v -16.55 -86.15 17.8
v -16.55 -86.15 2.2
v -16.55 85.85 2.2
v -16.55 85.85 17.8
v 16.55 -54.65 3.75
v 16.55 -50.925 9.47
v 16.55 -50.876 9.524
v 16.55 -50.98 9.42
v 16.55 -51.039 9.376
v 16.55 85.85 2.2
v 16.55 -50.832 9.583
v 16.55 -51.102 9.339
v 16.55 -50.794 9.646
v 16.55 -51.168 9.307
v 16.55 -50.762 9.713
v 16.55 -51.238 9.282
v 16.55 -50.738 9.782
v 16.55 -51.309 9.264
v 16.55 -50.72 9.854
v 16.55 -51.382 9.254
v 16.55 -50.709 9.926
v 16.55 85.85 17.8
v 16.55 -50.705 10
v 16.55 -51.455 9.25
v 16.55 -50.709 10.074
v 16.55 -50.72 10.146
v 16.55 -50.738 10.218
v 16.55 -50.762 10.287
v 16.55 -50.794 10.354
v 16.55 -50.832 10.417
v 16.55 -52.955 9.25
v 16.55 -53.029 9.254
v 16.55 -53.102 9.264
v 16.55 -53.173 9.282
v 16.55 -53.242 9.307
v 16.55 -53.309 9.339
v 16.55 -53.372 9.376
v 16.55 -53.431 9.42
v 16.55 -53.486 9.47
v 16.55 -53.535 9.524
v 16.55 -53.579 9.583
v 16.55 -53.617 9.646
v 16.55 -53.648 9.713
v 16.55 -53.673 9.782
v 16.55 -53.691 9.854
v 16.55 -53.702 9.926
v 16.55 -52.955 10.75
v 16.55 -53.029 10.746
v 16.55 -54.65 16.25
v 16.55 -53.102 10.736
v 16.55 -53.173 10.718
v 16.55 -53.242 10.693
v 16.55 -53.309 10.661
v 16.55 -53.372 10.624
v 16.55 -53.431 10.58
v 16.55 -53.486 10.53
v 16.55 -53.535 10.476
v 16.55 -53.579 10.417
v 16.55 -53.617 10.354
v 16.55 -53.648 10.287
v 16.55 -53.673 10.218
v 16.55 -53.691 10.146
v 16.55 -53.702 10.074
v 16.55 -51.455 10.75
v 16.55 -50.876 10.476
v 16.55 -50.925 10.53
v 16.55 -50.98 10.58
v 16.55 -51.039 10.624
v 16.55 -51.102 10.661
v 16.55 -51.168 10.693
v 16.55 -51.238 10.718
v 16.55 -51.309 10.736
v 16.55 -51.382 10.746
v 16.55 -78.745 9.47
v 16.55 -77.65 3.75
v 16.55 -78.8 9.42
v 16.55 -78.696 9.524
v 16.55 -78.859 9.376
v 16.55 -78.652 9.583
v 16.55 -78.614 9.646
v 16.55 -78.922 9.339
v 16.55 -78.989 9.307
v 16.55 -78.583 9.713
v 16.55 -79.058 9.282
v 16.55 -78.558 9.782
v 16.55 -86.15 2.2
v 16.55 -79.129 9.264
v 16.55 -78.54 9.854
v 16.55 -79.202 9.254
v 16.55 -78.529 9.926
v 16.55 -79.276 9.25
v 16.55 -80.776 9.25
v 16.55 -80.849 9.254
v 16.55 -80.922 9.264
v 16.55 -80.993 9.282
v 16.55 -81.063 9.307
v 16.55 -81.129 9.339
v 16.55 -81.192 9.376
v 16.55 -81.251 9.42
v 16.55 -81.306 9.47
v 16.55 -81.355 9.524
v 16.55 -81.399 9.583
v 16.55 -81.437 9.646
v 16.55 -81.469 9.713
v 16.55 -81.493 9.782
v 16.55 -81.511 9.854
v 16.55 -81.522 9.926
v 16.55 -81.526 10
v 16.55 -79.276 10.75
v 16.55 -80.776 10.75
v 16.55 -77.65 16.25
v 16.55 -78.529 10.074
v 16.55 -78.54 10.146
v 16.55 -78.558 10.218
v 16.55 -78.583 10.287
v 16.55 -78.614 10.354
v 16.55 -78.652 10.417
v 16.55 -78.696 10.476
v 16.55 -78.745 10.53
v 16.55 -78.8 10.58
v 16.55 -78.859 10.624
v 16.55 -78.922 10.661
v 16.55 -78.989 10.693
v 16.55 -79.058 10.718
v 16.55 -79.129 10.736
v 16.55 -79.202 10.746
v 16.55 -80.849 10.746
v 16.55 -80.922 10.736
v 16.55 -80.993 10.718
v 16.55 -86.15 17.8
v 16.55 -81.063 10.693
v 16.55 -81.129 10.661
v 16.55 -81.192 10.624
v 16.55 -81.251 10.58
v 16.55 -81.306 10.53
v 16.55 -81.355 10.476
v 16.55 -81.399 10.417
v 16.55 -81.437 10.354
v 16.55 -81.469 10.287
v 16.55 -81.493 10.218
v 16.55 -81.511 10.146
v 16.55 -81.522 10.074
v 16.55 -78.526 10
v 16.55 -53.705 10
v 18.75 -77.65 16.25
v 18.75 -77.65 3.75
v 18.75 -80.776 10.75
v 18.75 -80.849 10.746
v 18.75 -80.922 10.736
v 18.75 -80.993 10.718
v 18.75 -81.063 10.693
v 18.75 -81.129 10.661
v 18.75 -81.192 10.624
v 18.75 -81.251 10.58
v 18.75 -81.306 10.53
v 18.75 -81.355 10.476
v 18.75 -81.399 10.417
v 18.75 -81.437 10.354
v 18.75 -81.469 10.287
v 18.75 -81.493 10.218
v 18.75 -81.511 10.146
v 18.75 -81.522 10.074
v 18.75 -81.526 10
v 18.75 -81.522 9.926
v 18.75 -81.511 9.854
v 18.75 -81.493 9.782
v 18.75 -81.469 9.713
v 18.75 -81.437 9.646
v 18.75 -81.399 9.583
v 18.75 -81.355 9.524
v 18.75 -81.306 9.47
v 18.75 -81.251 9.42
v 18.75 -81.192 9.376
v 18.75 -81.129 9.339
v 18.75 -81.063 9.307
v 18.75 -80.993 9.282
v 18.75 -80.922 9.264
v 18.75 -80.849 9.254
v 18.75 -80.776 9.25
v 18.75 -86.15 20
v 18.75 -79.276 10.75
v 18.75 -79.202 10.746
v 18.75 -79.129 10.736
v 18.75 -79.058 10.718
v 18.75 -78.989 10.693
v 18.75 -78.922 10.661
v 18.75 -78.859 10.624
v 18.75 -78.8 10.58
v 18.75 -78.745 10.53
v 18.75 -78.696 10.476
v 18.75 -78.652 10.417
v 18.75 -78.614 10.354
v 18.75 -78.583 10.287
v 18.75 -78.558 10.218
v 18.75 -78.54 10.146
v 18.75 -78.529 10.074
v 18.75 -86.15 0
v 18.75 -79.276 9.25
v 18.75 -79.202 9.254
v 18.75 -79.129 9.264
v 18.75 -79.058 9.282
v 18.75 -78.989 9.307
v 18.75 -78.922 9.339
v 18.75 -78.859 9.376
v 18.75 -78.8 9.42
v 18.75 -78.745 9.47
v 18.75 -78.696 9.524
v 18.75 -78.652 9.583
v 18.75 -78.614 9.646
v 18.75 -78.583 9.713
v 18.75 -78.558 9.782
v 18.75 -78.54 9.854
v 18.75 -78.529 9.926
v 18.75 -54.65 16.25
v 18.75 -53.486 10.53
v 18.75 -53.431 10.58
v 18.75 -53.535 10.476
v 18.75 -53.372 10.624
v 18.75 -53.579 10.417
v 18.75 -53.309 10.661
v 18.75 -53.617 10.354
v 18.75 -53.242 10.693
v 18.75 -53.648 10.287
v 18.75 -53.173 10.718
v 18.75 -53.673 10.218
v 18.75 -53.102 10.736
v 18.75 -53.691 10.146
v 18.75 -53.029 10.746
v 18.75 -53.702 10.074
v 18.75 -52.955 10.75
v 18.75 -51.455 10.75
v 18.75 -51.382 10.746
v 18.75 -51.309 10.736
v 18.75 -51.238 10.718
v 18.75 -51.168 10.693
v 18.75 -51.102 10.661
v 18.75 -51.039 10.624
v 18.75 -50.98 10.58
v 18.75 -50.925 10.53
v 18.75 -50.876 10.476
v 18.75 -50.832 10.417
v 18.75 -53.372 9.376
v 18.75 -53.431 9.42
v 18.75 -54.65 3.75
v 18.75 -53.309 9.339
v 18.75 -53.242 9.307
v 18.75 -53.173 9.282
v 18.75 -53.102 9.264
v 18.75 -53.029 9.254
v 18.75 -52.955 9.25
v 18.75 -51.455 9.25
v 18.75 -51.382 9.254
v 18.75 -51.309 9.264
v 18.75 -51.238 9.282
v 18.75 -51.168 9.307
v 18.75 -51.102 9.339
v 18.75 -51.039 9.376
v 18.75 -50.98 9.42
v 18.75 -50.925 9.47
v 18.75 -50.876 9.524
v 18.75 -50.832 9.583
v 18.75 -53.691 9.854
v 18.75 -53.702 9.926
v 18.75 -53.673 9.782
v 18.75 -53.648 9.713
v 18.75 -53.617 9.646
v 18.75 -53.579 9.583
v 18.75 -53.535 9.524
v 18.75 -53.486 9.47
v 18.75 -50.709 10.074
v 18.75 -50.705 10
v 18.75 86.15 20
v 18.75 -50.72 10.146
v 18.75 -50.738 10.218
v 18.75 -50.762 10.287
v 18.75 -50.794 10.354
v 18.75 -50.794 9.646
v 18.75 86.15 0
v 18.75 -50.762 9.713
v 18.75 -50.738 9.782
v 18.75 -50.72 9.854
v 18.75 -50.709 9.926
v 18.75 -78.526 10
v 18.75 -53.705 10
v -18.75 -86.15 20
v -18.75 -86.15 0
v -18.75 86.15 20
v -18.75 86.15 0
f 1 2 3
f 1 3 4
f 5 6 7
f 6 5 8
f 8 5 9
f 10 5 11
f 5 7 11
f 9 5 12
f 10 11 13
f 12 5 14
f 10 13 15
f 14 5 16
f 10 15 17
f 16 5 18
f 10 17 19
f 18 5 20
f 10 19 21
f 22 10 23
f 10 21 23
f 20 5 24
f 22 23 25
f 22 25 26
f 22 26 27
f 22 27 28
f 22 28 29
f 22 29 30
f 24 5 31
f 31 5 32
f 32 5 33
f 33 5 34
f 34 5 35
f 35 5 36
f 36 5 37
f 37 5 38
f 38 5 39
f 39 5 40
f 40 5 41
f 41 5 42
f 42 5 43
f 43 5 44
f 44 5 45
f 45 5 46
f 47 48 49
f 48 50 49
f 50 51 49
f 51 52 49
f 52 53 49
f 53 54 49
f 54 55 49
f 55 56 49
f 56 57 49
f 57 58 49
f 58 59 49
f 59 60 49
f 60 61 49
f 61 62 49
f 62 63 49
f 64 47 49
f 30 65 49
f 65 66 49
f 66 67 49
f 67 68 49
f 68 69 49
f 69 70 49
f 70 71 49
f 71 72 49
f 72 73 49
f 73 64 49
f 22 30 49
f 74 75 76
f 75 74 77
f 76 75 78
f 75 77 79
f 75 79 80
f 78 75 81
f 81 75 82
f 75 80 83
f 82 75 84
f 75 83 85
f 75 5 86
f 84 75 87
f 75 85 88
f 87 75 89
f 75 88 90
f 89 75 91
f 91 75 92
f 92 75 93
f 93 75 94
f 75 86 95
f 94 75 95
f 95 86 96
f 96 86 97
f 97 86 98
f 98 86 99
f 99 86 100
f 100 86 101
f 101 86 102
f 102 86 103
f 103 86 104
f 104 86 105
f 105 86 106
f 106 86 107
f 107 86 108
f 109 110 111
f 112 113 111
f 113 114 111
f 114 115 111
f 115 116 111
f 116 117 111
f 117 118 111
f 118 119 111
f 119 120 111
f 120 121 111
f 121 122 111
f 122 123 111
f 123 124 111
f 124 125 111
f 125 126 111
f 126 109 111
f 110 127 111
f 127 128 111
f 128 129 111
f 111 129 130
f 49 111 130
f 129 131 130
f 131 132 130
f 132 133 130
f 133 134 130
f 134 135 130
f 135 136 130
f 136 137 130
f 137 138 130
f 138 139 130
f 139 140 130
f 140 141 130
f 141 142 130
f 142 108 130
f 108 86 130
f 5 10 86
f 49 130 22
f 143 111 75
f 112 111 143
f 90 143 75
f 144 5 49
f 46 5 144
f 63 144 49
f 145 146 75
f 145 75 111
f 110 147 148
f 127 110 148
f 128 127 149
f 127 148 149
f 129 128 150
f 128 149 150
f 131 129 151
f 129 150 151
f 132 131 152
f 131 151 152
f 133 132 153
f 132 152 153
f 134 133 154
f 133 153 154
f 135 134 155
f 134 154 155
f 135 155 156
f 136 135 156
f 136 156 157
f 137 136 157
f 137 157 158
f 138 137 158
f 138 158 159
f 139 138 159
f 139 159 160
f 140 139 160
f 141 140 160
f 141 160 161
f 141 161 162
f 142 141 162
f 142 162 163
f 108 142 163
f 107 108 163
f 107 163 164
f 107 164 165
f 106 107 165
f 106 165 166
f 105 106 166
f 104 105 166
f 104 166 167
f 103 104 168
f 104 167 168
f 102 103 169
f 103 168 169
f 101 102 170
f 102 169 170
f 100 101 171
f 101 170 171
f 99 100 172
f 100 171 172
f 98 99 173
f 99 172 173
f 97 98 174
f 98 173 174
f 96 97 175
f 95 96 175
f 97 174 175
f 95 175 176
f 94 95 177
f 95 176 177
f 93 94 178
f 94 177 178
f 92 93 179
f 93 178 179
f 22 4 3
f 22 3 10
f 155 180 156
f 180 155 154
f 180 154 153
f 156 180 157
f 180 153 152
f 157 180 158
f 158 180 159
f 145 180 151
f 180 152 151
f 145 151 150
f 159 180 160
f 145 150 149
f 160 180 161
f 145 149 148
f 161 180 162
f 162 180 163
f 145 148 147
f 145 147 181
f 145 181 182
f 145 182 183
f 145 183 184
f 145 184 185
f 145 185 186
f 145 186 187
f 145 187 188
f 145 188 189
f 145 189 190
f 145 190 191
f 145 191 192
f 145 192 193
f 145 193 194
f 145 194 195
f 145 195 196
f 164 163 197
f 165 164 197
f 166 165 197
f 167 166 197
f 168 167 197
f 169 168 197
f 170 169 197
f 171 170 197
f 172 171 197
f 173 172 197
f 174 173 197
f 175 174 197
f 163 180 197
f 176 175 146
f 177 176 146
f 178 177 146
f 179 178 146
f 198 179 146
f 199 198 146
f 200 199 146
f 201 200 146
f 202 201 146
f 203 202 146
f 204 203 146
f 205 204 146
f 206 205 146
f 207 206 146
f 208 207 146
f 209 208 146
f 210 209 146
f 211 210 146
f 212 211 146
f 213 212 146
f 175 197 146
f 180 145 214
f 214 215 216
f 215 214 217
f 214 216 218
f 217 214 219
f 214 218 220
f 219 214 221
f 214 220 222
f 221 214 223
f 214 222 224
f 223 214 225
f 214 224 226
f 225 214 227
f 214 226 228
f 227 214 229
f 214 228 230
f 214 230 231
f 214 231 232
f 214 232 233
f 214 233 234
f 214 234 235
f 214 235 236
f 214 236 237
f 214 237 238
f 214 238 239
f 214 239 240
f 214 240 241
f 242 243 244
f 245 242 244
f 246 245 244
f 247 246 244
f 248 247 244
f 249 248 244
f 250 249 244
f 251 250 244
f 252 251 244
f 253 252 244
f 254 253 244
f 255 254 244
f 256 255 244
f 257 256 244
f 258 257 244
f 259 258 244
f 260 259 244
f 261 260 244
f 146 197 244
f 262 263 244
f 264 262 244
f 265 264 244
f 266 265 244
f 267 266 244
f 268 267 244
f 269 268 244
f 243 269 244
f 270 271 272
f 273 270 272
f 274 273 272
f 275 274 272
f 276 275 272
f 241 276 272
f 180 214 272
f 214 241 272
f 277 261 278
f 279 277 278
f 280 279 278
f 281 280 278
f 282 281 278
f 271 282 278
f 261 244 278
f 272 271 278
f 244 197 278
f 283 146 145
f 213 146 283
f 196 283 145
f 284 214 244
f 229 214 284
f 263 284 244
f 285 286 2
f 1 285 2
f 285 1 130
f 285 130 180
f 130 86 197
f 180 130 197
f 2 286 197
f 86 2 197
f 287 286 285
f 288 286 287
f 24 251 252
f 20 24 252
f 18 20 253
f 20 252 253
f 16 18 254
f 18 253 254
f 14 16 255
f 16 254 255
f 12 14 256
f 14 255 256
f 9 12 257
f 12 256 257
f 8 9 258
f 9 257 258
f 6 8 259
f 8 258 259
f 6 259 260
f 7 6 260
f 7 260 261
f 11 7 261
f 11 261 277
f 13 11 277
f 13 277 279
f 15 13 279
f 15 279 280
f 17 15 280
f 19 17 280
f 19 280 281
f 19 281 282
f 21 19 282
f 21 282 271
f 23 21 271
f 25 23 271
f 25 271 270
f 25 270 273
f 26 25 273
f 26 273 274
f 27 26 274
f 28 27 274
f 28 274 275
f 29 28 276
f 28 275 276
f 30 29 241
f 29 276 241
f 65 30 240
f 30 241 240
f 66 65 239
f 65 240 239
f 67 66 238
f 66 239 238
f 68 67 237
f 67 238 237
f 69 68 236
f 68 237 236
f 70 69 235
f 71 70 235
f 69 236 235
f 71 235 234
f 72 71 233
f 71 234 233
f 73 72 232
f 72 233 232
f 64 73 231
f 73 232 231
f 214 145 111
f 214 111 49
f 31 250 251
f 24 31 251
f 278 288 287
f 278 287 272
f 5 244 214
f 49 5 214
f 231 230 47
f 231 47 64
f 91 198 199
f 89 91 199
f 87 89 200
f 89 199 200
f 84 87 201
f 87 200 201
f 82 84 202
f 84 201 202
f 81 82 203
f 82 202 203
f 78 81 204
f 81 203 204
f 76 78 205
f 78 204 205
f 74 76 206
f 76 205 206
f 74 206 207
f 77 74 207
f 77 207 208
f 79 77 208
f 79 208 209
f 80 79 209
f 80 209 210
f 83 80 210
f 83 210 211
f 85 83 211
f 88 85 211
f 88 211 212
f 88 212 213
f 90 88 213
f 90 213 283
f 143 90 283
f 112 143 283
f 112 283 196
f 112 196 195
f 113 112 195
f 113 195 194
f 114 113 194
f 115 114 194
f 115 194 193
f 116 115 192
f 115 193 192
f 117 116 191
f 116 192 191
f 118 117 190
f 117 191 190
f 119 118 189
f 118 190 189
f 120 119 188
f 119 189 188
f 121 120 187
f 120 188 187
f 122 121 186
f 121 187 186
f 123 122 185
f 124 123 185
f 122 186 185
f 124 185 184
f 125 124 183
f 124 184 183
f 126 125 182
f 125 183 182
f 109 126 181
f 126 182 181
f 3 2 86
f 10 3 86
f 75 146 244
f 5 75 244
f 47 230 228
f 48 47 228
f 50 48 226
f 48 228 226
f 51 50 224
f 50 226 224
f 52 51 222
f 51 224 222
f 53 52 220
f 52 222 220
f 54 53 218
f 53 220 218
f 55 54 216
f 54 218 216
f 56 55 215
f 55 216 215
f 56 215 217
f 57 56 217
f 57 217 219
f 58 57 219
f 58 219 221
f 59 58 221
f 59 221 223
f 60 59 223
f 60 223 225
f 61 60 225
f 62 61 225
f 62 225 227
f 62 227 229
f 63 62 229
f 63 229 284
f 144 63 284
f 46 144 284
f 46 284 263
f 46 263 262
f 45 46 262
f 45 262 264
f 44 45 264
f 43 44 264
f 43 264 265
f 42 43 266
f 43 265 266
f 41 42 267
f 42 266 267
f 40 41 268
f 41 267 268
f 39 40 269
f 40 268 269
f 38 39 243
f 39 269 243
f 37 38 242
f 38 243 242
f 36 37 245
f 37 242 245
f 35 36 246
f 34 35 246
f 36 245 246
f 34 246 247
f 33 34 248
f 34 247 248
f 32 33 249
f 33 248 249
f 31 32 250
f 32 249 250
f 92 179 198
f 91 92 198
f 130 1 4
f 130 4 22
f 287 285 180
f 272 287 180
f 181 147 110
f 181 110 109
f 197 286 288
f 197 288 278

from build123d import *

# Parameters (mm, degrees)
SKETCH007_W     = 37.5
SKETCH007_H     = 172.3
PAD002_DEPTH    = 20
SKETCH006_W     = 33.1
SKETCH006_H     = 15.6
POCKET004_DEPTH = 172
SKETCH009_W     = 23
SKETCH009_H     = 12.5
POCKET003_DEPTH = 10
POCKET005_DEPTH = 5


with BuildPart() as part:
    # Sketch007 → Pad002 (new body)
    with BuildSketch(Plane.XY):
        Rectangle(SKETCH007_W, SKETCH007_H)
    extrude(amount=PAD002_DEPTH)

    # Sketch006 (on Face1 of Pad002) → Pocket004 (cut)
    with BuildSketch(Plane.XZ.offset(86.15)):
        with Locations((0, 10)):
            Rectangle(SKETCH006_W, SKETCH006_H)
    extrude(amount=-POCKET004_DEPTH, mode=Mode.SUBTRACT)

    # Sketch009 (on Face5 of Pocket004) → Pocket003 (cut)
    with BuildSketch(Plane.YZ.offset(18.75)):
        with Locations((-66.15, 10)):
            Rectangle(SKETCH009_W, SKETCH009_H)
    extrude(amount=-POCKET003_DEPTH, mode=Mode.SUBTRACT)

    # Sketch005 (on Face5 of Pocket003) → Pocket005 (cut)
    with BuildSketch(Plane.YZ.offset(18.75)):
        with BuildLine():
            ThreePointArc((-80.775673, 10.75), (-81.525673, 10), (-80.775673, 9.25))
            Line((-80.775673, 9.25), (-79.275673, 9.25))
            ThreePointArc((-79.275673, 9.25), (-78.525673, 10), (-79.275673, 10.75))
            Line((-80.775673, 10.75), (-79.275673, 10.75))
        make_face()
        with BuildLine():
            ThreePointArc((-52.955318, 10.75), (-53.705318, 10), (-52.955318, 9.25))
            Line((-52.955318, 9.25), (-51.455318, 9.25))
            ThreePointArc((-51.455318, 9.25), (-50.705318, 10), (-51.455318, 10.75))
            Line((-52.955318, 10.75), (-51.455318, 10.75))
        make_face()
    extrude(amount=-POCKET005_DEPTH, mode=Mode.SUBTRACT)


solid = part.part
